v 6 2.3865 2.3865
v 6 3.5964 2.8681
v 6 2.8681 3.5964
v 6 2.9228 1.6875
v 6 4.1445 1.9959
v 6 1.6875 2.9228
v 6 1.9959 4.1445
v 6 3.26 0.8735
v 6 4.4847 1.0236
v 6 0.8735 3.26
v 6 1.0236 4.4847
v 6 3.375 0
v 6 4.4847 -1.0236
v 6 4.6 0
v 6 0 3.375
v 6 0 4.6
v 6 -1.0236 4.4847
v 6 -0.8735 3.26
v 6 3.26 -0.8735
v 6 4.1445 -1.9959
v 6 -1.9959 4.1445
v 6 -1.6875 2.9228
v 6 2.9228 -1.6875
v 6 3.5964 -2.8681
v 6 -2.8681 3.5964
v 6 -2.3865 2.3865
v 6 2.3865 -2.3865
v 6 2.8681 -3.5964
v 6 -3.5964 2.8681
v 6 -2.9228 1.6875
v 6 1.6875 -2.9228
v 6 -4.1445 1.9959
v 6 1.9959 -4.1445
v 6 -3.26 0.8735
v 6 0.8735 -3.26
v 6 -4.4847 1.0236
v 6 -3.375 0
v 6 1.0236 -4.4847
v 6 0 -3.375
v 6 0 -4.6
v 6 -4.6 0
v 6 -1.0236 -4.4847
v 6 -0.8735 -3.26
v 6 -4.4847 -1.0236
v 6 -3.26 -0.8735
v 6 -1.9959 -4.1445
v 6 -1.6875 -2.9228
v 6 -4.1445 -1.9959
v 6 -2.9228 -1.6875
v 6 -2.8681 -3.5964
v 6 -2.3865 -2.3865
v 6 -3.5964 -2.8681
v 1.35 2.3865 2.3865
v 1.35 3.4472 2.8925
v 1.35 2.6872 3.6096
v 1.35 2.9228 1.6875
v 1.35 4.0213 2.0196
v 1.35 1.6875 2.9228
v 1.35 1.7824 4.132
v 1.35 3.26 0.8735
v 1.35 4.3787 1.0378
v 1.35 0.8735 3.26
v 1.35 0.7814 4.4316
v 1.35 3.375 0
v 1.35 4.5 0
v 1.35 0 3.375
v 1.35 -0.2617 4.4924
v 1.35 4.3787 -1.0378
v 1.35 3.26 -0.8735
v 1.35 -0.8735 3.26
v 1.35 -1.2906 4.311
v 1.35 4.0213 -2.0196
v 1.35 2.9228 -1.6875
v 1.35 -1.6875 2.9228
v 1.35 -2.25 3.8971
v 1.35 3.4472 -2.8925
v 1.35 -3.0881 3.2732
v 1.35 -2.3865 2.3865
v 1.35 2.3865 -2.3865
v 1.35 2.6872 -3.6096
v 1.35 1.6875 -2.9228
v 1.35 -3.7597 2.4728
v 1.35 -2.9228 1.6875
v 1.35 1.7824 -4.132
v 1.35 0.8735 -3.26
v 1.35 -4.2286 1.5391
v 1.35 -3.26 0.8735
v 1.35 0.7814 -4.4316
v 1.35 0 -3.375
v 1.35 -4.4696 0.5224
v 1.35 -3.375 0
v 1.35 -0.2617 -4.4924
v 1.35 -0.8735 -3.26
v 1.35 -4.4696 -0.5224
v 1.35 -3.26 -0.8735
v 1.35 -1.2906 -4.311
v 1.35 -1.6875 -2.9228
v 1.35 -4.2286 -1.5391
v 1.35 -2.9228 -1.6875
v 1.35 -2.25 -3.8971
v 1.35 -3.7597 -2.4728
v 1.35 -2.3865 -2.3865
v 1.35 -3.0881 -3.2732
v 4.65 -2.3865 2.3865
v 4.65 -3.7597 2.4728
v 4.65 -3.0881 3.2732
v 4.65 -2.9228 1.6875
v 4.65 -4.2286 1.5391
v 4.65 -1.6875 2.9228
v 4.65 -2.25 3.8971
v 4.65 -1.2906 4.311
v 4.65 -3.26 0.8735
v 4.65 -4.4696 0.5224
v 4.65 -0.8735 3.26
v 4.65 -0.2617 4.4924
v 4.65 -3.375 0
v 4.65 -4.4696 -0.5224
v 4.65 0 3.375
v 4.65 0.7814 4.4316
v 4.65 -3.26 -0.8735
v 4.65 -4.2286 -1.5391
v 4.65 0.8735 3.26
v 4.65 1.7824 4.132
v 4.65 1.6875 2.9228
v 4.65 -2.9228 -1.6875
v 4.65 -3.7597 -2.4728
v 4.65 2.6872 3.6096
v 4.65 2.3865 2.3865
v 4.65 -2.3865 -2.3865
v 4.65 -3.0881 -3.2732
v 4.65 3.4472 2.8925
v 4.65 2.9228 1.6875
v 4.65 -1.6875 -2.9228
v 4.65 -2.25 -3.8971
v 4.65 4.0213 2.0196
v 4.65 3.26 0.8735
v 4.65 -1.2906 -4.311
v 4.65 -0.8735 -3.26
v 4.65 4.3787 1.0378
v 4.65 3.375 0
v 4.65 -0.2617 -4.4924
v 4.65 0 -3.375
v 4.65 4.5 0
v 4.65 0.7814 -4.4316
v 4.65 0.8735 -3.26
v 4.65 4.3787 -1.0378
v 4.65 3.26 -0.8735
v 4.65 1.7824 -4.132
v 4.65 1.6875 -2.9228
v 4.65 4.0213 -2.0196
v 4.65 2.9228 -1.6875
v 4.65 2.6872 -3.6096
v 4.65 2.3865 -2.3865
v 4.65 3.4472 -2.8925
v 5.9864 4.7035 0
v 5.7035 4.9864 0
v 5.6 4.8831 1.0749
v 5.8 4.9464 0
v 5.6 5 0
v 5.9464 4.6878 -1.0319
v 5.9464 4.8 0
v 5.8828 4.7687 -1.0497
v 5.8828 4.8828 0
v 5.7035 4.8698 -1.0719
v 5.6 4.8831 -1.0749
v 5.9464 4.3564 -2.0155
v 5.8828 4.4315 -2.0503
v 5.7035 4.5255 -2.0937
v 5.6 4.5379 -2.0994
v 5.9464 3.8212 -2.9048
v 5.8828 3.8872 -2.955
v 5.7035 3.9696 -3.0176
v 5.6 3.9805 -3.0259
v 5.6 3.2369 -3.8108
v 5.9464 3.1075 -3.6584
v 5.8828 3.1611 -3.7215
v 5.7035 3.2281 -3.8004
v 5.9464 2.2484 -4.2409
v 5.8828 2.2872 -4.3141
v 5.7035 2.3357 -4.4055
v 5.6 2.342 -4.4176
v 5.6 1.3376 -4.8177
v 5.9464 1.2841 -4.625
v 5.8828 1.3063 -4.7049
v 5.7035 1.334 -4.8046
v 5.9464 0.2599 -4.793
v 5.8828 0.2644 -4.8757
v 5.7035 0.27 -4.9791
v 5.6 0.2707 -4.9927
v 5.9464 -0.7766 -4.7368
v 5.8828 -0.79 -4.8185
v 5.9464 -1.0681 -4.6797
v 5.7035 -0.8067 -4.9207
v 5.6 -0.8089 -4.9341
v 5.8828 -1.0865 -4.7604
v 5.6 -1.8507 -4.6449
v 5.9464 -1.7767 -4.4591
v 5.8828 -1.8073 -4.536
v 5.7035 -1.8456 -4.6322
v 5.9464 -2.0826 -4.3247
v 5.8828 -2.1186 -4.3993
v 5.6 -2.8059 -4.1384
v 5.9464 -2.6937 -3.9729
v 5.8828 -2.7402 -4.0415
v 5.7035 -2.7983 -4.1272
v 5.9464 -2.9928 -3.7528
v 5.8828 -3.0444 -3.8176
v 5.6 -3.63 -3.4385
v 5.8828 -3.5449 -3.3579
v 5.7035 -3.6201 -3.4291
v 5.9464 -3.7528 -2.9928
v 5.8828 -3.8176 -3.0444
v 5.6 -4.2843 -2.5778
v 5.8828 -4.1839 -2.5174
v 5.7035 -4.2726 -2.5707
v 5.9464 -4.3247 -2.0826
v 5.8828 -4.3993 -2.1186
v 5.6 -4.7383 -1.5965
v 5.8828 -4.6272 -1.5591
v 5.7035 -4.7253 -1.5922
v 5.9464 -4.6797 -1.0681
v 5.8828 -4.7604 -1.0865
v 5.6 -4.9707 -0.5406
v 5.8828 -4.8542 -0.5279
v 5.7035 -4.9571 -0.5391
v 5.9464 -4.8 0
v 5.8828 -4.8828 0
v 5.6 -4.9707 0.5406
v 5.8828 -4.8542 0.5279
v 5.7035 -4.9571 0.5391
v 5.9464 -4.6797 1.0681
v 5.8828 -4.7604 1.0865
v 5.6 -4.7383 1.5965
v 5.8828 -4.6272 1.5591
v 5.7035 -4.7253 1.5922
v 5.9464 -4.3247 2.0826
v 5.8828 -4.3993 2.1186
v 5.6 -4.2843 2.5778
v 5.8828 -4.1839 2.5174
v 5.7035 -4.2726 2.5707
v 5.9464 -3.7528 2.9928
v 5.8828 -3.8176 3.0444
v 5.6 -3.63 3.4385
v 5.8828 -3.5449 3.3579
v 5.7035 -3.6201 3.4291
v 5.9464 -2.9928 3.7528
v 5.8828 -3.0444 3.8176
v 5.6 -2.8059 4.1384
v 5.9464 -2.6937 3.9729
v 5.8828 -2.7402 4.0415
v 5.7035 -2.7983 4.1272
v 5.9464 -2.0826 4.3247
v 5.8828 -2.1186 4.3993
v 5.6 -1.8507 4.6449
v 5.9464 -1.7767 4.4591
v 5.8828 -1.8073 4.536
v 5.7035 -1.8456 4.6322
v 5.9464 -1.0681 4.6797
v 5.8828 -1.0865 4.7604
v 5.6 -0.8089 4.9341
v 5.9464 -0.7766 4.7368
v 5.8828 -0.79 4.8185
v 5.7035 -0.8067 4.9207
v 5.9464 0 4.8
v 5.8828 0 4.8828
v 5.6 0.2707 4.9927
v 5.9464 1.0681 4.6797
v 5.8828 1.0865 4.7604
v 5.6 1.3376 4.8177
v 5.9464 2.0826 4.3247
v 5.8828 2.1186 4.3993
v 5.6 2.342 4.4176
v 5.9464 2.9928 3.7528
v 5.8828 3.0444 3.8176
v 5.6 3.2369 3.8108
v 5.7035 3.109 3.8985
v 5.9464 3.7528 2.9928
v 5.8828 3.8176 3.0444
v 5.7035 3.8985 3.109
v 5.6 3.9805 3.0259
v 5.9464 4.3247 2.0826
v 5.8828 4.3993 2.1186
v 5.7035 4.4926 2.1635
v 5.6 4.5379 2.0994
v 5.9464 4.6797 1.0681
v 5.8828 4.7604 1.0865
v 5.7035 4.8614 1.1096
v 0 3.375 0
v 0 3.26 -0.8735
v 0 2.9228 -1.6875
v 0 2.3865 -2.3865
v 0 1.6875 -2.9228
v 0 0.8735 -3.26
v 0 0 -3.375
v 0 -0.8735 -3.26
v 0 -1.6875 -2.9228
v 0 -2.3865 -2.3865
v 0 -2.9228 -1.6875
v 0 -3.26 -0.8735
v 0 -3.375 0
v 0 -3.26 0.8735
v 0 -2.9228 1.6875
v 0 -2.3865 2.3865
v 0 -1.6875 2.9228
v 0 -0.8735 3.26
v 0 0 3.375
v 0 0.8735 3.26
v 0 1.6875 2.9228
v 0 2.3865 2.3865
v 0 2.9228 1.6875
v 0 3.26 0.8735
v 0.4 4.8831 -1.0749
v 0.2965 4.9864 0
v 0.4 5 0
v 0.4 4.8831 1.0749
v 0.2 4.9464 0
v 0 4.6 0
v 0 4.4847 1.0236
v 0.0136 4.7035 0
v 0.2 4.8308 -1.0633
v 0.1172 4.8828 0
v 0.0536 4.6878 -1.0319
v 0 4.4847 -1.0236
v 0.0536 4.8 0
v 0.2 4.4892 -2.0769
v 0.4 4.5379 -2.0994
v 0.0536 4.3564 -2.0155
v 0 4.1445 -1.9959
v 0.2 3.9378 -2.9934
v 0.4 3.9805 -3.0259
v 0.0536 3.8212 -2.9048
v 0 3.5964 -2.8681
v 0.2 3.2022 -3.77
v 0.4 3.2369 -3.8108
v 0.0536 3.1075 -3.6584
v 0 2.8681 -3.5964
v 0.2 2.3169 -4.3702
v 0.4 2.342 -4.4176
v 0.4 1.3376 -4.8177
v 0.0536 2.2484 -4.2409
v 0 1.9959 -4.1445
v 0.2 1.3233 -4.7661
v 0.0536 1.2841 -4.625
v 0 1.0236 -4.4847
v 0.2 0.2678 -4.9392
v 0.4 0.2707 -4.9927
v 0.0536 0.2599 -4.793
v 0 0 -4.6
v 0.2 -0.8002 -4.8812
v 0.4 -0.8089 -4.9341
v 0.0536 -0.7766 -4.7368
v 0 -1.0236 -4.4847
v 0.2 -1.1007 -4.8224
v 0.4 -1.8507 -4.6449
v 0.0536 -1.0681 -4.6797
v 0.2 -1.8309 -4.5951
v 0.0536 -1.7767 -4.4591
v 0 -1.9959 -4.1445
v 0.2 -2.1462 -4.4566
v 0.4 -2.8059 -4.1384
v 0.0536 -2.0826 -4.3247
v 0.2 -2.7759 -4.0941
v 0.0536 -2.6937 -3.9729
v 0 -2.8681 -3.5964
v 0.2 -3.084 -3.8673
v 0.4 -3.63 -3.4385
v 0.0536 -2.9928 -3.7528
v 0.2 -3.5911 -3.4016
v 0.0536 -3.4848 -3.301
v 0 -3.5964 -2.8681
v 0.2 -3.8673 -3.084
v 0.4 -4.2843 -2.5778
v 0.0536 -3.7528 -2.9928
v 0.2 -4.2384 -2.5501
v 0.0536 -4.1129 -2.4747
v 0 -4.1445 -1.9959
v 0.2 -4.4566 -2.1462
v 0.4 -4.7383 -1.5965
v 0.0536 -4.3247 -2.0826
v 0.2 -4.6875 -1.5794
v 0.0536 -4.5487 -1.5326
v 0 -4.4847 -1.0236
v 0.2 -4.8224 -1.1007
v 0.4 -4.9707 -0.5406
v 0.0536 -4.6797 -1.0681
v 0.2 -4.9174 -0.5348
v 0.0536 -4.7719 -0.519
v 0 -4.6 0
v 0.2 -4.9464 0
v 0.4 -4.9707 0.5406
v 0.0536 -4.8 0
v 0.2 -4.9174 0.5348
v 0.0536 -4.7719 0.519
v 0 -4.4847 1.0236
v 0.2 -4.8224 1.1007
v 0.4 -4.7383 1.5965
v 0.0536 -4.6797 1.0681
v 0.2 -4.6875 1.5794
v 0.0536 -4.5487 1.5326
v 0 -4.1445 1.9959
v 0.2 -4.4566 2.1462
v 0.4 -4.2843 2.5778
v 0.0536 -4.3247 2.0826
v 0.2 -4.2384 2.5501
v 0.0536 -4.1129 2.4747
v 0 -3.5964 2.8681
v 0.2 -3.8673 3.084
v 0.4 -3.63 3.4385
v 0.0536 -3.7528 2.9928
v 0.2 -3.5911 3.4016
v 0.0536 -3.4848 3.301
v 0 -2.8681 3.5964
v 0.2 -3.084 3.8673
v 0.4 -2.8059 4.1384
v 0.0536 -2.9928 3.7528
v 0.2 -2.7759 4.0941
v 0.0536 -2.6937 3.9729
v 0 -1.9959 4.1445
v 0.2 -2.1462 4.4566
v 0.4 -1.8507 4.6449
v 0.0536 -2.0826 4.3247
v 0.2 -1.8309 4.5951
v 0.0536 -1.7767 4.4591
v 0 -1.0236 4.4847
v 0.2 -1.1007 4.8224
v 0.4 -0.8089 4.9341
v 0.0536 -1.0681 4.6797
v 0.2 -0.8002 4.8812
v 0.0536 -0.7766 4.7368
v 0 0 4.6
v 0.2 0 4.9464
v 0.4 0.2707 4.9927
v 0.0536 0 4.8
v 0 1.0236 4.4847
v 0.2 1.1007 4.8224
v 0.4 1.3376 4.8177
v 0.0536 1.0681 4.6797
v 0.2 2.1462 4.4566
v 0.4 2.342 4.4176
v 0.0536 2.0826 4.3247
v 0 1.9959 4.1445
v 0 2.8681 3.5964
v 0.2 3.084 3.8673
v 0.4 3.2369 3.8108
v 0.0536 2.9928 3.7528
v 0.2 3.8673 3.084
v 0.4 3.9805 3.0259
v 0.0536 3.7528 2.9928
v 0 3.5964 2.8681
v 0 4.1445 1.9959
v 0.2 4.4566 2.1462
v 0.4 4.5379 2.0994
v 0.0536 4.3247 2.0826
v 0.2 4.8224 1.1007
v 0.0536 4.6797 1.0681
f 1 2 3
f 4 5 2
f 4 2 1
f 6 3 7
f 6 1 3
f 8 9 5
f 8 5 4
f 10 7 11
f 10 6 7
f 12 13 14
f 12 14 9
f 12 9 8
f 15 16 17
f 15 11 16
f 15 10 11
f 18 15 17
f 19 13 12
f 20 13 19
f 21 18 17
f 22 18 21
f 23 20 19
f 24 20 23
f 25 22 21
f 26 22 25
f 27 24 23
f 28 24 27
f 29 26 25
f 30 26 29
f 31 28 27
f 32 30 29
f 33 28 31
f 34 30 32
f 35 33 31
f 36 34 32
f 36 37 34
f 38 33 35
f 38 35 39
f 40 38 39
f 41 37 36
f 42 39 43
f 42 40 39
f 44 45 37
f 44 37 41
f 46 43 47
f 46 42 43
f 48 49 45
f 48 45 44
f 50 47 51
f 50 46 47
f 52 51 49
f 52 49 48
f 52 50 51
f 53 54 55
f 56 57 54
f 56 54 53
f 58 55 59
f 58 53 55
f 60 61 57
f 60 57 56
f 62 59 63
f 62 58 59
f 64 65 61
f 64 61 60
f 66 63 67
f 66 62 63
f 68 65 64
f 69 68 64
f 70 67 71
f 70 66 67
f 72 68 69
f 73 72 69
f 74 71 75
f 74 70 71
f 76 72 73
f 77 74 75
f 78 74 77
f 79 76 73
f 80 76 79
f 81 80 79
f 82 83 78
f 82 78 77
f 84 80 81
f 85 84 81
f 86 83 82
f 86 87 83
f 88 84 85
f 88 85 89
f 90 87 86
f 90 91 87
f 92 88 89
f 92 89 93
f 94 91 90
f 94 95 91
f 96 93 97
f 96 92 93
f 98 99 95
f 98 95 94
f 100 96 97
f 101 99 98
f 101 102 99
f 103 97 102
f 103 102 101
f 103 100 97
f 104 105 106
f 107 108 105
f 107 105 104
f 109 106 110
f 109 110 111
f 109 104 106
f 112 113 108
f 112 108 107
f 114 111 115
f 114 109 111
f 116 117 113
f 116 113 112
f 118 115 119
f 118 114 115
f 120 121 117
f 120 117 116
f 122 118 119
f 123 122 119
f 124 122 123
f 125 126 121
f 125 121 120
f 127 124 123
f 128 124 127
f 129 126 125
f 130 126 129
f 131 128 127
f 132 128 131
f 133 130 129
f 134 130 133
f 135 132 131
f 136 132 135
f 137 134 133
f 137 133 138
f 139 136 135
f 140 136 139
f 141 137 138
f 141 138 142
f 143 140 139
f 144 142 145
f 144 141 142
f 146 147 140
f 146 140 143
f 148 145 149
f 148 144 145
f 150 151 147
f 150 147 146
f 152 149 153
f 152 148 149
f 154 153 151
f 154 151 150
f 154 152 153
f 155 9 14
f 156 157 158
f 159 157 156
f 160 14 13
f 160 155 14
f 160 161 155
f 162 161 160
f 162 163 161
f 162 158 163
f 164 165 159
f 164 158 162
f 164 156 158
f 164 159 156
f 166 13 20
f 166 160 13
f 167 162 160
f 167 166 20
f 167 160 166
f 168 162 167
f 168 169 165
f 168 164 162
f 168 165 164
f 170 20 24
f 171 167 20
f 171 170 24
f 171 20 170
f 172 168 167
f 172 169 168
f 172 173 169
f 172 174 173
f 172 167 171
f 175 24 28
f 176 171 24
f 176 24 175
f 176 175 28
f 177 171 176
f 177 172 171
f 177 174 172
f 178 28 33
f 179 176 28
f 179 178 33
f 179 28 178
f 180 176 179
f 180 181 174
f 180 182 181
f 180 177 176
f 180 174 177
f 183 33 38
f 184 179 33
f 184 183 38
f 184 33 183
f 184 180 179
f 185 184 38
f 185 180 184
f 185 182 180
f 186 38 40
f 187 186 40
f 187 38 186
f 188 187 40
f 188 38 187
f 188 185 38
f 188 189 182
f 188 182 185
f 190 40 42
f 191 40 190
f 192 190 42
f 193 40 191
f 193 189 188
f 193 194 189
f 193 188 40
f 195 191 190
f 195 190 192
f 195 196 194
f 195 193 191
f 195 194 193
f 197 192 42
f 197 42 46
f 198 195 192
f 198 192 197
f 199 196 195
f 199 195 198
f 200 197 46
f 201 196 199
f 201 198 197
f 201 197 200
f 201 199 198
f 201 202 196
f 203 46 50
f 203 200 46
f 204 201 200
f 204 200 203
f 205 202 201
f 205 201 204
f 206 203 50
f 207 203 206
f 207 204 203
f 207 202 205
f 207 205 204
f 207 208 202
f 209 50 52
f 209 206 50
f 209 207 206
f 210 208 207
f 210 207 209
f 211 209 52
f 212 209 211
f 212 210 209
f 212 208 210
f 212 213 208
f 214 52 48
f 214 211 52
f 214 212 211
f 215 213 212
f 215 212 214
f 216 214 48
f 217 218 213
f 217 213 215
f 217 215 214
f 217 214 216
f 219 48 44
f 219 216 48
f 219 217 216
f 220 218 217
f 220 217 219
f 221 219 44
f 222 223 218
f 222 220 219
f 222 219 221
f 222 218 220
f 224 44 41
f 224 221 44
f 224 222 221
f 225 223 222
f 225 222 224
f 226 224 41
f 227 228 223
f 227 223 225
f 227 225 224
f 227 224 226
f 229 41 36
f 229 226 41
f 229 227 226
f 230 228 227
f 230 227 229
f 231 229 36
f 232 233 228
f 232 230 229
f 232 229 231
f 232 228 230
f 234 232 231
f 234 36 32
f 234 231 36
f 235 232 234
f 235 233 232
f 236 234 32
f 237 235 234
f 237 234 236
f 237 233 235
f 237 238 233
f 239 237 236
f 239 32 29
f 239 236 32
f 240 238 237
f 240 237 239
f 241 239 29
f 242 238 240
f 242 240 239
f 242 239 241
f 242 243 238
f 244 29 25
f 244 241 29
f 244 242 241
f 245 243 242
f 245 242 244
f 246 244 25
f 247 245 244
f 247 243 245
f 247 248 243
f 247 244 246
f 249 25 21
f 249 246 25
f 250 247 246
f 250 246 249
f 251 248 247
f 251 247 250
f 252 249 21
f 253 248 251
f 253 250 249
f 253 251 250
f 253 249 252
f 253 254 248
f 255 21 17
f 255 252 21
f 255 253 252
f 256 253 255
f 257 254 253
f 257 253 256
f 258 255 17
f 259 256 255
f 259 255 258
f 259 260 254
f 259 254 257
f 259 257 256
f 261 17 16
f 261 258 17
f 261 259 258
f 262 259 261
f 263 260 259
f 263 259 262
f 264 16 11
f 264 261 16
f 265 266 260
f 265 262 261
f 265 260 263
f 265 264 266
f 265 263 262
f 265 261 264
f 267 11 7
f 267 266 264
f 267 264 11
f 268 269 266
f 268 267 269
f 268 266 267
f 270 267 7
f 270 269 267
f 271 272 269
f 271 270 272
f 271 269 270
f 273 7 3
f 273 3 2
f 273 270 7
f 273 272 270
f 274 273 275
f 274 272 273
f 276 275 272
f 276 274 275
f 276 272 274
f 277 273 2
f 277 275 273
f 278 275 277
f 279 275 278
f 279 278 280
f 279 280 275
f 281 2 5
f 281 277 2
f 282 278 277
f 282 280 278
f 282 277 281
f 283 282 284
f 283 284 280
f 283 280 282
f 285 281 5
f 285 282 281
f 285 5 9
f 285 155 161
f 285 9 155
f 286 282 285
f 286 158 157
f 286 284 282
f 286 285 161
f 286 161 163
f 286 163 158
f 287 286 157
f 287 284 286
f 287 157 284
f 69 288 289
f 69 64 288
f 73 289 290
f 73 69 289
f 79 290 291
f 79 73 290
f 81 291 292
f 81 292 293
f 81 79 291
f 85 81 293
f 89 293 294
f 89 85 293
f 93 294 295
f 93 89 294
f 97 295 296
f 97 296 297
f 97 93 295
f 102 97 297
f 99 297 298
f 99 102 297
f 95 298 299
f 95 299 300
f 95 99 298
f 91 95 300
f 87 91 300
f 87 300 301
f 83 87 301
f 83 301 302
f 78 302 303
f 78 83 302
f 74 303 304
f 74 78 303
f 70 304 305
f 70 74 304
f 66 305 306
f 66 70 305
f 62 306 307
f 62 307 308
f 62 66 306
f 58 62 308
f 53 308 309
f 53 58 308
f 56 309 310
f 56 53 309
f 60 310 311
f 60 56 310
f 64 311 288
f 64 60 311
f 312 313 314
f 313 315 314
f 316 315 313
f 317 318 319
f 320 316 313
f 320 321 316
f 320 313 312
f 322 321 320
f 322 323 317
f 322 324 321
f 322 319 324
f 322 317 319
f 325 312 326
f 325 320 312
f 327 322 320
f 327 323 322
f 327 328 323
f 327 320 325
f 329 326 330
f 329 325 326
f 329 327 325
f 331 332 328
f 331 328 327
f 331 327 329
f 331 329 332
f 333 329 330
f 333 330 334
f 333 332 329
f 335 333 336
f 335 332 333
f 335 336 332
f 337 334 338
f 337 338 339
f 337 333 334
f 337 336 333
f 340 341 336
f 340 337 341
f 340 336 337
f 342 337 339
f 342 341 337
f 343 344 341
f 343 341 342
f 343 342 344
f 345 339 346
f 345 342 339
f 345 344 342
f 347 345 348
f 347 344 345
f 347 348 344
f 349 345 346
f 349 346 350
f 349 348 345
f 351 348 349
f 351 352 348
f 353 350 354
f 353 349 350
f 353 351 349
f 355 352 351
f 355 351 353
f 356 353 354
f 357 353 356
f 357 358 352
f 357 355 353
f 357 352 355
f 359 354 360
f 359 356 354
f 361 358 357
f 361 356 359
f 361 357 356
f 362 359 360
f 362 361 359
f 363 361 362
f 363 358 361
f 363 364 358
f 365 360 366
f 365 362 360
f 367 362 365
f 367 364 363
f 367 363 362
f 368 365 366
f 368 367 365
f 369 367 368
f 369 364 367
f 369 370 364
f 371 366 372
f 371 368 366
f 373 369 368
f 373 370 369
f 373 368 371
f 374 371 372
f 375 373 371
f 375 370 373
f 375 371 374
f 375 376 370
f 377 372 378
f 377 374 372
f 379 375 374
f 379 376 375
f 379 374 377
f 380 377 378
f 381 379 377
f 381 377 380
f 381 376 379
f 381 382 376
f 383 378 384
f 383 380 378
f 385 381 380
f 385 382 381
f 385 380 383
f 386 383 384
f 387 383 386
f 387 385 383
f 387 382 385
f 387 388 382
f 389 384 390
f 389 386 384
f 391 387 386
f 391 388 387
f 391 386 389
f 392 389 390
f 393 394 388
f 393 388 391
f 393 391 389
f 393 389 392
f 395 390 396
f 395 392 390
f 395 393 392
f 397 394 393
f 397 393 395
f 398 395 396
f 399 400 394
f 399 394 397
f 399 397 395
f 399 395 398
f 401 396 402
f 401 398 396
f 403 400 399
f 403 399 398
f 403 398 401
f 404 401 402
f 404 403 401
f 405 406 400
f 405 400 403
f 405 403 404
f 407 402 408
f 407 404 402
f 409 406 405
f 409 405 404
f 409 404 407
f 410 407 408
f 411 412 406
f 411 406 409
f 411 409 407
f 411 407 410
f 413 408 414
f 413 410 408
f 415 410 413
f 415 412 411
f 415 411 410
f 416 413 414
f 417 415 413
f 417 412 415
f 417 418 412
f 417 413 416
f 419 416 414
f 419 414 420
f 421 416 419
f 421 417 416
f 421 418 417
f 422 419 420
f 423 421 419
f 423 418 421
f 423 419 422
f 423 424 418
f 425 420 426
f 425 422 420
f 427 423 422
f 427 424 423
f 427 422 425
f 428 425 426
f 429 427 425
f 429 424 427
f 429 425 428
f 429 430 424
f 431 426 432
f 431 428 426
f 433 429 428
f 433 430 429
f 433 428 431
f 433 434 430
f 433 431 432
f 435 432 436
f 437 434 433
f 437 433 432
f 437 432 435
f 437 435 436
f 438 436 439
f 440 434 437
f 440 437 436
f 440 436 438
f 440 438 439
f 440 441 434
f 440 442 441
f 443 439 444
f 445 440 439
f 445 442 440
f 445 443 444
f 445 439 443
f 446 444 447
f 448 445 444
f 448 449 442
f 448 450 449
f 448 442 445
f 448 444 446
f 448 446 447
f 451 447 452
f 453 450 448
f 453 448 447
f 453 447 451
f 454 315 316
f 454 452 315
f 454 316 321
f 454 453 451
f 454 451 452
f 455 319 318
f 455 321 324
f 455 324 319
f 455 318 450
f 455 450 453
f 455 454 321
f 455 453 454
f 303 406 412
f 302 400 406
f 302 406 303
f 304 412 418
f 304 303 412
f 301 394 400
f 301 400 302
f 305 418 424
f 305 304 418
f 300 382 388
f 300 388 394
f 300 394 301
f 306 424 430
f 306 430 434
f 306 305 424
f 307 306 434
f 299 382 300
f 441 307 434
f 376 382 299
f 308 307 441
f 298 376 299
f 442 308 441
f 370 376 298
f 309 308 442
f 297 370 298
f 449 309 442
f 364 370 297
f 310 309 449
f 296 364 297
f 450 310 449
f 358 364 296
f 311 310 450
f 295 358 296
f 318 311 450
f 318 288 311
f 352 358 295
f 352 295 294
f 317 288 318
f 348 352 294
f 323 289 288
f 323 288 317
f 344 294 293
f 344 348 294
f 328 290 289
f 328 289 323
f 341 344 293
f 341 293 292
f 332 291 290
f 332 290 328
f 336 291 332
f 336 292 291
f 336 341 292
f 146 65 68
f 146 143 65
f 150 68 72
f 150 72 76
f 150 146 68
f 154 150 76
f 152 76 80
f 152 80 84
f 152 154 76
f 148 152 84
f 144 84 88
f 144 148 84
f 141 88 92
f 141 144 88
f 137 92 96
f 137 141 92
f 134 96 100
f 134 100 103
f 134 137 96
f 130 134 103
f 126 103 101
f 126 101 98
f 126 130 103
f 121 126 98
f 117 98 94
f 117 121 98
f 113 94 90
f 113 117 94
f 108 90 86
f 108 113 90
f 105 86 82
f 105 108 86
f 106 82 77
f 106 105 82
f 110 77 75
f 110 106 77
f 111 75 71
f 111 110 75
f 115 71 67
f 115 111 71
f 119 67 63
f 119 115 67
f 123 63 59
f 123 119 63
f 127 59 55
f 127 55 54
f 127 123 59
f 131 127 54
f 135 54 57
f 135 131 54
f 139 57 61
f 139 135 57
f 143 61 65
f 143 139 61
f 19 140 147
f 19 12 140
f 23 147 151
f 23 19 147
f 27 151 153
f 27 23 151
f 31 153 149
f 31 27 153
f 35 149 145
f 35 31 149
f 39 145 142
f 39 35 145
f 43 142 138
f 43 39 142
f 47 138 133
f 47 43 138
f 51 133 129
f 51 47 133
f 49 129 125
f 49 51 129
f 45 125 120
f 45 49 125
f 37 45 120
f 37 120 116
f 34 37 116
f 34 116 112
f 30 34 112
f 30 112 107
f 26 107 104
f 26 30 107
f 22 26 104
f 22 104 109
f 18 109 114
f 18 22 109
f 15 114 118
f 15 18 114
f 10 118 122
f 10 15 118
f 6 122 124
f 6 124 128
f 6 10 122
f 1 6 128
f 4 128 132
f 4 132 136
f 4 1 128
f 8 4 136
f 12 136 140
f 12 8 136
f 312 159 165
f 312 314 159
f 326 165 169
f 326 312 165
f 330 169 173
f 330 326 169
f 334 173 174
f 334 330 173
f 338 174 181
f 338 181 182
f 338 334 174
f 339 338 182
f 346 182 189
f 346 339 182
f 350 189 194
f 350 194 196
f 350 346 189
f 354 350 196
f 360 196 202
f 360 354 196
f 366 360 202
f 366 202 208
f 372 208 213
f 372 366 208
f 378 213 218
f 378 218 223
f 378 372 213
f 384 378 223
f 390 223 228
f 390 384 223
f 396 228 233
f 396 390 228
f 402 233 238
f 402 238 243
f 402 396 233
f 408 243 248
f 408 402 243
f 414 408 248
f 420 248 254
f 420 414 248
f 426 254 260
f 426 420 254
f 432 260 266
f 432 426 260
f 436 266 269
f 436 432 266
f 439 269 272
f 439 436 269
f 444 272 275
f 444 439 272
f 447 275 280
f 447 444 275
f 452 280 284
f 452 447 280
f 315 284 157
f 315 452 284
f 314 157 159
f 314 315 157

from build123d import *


with BuildPart() as part:
    # Sketch1 → Revolve1 (revolve)
    with BuildSketch(Plane.XY):
        with BuildLine():
            Line((0, 4.6), (0, 3.375))
            Line((0, 3.375), (1.35, 3.375))
            Line((1.35, 3.375), (1.35, 4.5))
            Line((1.35, 4.5), (4.65, 4.5))
            Line((4.65, 4.5), (4.65, 3.375))
            Line((4.65, 3.375), (6, 3.375))
            Line((6, 3.375), (6, 4.6))
            ThreePointArc((6, 4.6), (5.882842712, 4.882842712), (5.6, 5))
            Line((5.6, 5), (0.4, 5))
            ThreePointArc((0.4, 5), (0.117157288, 4.882842712), (0, 4.6))
        make_face()
    revolve(axis=Axis((50, 0, 0), (-1, 0, 0)))


solid = part.part
